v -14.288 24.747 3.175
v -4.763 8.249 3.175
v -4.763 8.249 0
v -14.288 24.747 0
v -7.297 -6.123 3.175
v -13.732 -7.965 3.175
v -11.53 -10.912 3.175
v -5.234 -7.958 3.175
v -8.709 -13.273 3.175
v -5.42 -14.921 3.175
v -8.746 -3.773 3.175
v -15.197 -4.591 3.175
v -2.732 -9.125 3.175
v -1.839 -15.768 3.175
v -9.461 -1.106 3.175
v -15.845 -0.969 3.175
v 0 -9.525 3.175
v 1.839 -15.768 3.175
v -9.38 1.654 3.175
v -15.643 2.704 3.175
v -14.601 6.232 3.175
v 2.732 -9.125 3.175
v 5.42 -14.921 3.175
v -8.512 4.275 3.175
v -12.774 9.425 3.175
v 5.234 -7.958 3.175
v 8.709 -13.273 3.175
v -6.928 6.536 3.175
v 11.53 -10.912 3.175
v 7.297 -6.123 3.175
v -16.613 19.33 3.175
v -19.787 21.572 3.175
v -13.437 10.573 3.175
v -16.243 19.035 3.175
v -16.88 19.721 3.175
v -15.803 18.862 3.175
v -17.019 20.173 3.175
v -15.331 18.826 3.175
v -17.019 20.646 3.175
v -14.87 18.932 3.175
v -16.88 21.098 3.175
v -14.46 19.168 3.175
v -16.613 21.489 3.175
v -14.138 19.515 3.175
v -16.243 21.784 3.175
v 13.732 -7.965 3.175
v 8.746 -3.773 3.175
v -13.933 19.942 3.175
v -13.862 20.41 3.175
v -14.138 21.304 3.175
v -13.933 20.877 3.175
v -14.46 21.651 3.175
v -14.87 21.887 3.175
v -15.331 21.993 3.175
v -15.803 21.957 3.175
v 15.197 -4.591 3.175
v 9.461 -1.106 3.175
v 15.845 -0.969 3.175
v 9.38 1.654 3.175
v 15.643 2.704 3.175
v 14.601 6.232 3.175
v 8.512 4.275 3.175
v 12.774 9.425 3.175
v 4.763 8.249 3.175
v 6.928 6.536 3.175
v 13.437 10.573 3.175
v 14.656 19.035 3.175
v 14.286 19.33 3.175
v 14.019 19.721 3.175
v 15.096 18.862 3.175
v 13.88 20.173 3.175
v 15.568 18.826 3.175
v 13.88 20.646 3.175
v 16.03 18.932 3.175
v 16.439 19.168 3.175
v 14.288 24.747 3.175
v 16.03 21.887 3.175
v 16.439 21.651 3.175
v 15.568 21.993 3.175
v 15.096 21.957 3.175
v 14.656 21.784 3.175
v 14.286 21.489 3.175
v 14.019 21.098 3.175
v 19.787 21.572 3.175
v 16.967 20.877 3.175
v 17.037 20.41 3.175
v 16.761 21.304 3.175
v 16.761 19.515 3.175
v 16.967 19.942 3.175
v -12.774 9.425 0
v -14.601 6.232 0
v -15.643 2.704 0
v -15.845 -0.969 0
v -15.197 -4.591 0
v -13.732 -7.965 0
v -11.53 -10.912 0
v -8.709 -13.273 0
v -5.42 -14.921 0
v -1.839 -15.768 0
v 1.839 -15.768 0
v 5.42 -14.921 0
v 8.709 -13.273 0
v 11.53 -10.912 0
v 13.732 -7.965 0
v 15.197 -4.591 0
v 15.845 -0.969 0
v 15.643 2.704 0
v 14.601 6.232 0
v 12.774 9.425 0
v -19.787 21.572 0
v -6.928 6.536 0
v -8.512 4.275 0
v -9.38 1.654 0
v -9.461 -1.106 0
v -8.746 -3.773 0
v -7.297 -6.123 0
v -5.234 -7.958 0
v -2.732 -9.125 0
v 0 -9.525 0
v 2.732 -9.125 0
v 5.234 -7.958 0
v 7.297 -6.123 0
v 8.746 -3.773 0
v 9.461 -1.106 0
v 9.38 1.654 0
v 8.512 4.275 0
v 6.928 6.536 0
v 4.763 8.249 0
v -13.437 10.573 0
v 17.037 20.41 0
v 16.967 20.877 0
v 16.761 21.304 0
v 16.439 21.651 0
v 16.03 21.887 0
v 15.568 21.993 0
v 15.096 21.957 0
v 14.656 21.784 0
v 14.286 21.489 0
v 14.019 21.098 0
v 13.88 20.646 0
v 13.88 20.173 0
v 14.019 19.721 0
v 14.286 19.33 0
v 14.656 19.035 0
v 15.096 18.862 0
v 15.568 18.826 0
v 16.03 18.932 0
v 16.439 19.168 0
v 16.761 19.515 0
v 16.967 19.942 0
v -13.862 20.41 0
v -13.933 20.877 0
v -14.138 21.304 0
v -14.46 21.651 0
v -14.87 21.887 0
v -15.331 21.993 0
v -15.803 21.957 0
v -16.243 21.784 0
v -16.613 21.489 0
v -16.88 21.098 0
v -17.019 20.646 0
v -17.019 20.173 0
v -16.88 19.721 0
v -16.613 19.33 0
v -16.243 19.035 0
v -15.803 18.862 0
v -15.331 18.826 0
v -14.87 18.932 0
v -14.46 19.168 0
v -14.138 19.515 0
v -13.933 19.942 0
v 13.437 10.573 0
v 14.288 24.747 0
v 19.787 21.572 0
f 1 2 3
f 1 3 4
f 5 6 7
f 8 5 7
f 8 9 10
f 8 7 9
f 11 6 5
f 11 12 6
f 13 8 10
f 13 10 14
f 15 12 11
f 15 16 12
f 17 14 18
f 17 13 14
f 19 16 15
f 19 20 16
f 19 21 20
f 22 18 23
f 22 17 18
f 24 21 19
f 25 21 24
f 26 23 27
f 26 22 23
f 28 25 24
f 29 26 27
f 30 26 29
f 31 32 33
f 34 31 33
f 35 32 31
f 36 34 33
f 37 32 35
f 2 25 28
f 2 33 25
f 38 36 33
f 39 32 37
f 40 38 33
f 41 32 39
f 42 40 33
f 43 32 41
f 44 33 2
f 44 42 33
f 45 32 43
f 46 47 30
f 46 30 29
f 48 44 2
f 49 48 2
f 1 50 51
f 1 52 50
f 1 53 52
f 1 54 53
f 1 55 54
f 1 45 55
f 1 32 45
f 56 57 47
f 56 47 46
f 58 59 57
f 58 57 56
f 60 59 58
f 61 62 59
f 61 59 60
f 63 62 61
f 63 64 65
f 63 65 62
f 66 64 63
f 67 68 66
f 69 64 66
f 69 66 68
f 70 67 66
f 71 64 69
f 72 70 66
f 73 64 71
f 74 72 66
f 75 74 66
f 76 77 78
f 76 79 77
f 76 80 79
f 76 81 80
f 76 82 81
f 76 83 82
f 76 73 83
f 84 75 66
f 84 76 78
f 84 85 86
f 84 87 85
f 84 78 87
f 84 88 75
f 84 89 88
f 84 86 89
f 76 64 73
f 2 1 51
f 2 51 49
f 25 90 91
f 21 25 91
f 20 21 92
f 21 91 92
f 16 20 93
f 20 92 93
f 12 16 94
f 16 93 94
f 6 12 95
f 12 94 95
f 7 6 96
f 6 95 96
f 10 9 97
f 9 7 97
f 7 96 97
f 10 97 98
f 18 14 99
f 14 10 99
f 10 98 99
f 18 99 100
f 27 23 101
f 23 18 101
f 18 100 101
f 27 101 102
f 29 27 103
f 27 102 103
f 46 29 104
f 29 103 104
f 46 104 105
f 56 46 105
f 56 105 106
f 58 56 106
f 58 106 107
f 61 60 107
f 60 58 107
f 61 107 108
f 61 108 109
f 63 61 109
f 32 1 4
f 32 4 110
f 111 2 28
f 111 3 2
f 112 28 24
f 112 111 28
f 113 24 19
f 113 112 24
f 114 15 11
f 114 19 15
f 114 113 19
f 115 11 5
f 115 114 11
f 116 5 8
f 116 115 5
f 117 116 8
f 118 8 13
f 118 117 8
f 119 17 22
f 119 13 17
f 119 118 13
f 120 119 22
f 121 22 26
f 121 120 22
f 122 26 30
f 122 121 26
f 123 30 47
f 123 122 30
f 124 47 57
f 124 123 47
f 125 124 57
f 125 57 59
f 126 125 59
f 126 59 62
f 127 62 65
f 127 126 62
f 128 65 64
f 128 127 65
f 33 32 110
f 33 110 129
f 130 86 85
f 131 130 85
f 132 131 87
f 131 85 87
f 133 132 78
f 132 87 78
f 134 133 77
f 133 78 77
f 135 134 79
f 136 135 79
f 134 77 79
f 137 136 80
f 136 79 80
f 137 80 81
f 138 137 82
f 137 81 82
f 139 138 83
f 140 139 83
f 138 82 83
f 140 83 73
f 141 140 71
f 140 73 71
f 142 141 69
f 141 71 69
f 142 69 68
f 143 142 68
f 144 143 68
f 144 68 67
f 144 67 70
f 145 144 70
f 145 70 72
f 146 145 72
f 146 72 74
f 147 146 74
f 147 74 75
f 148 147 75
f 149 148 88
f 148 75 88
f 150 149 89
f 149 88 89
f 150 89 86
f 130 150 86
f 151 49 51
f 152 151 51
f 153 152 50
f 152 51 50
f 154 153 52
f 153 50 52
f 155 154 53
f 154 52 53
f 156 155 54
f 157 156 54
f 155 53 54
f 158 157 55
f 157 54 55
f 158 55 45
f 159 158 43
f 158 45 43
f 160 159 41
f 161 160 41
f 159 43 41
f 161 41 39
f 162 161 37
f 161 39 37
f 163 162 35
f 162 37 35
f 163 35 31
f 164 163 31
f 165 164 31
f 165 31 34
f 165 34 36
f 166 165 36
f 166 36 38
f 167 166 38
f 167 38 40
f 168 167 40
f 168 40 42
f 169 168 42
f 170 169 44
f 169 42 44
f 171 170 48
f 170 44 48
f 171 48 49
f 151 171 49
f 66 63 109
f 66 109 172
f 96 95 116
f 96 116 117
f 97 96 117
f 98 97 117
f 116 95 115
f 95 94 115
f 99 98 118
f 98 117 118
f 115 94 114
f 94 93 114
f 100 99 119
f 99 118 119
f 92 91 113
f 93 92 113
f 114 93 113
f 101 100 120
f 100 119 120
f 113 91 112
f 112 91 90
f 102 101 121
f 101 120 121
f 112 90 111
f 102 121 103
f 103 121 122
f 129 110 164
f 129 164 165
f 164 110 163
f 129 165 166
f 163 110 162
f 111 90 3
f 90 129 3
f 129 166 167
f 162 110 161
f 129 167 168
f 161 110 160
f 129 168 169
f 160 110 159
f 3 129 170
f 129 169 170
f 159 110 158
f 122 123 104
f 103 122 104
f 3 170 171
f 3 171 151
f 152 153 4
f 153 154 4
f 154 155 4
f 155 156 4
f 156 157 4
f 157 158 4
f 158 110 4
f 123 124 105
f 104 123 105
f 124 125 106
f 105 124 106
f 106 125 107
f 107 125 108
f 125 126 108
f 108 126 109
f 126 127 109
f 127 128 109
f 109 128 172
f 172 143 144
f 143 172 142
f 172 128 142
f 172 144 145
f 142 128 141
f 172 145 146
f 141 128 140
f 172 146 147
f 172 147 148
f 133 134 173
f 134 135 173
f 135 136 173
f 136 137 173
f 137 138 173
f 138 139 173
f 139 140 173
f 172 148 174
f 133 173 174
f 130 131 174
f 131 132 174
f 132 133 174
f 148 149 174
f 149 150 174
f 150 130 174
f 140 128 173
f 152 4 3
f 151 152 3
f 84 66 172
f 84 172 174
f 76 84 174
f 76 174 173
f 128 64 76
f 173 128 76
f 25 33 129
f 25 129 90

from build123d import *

# Parameters (mm, degrees)
SKETCH2_R           = 15.875
SKETCH2_R_2         = 12.7
SKETCH2_R_3         = 9.525
BOSS_EXTRUDE1_DEPTH = 3.175
SKETCH3_R           = 1.5875
BOSS_EXTRUDE2_DEPTH = 3.175
CUT_EXTRUDE1_DEPTH  = 3.175


with BuildPart() as part:
    # Sketch2 → Boss-Extrude1 (new body)
    with BuildSketch(Plane.XY):
        Circle(SKETCH2_R)
        Circle(SKETCH2_R_2, mode=Mode.SUBTRACT)
        Circle(SKETCH2_R_2)
        Circle(SKETCH2_R_3, mode=Mode.SUBTRACT)
    extrude(amount=BOSS_EXTRUDE1_DEPTH)

    # Sketch3 → Boss-Extrude2 (add)
    with BuildSketch(Plane.XY.offset(3.175)):
        with BuildLine():
            ThreePointArc((-12.77410023, 9.425390619), (-10.578949158, 11.836446245), (-7.9375, 13.748153285))
            Line((-7.9375, 13.748153285), (-14.2875, 24.746675913))
            Line((-14.2875, 24.746675913), (-19.786761314, 21.571675913))
            Line((-19.786761314, 21.571675913), (-13.436761314, 10.573153285))
            Line((-13.436761314, 10.573153285), (-12.77410023, 9.425390619))
        make_face()
        with Locations((-15.449630657, 20.409545256)):
            Circle(SKETCH3_R, mode=Mode.SUBTRACT)
        with BuildLine():
            Line((14.2875, 24.746675913), (7.9375, 13.748153285))
            ThreePointArc((7.9375, 13.748153285), (10.578949158, 11.836446245), (12.77410023, 9.425390619))
            Line((12.77410023, 9.425390619), (13.436761314, 10.573153285))
            Line((13.436761314, 10.573153285), (19.786761314, 21.571675913))
            Line((19.786761314, 21.571675913), (14.2875, 24.746675913))
        make_face()
        with Locations((15.449630657, 20.409545256)):
            Circle(SKETCH3_R, mode=Mode.SUBTRACT)
    extrude(amount=-BOSS_EXTRUDE2_DEPTH)

    # Sketch5 → Cut-Extrude1 (cut)
    with BuildSketch(Plane.XY.offset(3.175)):
        with BuildLine():
            Line((-7.9375, 13.748153285), (0, 0))
            Line((0, 0), (7.9375, 13.748153285))
            ThreePointArc((7.9375, 13.748153285), (0, 15.875), (-7.9375, 13.748153285))
        make_face()
    extrude(amount=-CUT_EXTRUDE1_DEPTH, mode=Mode.SUBTRACT)


solid = part.part
